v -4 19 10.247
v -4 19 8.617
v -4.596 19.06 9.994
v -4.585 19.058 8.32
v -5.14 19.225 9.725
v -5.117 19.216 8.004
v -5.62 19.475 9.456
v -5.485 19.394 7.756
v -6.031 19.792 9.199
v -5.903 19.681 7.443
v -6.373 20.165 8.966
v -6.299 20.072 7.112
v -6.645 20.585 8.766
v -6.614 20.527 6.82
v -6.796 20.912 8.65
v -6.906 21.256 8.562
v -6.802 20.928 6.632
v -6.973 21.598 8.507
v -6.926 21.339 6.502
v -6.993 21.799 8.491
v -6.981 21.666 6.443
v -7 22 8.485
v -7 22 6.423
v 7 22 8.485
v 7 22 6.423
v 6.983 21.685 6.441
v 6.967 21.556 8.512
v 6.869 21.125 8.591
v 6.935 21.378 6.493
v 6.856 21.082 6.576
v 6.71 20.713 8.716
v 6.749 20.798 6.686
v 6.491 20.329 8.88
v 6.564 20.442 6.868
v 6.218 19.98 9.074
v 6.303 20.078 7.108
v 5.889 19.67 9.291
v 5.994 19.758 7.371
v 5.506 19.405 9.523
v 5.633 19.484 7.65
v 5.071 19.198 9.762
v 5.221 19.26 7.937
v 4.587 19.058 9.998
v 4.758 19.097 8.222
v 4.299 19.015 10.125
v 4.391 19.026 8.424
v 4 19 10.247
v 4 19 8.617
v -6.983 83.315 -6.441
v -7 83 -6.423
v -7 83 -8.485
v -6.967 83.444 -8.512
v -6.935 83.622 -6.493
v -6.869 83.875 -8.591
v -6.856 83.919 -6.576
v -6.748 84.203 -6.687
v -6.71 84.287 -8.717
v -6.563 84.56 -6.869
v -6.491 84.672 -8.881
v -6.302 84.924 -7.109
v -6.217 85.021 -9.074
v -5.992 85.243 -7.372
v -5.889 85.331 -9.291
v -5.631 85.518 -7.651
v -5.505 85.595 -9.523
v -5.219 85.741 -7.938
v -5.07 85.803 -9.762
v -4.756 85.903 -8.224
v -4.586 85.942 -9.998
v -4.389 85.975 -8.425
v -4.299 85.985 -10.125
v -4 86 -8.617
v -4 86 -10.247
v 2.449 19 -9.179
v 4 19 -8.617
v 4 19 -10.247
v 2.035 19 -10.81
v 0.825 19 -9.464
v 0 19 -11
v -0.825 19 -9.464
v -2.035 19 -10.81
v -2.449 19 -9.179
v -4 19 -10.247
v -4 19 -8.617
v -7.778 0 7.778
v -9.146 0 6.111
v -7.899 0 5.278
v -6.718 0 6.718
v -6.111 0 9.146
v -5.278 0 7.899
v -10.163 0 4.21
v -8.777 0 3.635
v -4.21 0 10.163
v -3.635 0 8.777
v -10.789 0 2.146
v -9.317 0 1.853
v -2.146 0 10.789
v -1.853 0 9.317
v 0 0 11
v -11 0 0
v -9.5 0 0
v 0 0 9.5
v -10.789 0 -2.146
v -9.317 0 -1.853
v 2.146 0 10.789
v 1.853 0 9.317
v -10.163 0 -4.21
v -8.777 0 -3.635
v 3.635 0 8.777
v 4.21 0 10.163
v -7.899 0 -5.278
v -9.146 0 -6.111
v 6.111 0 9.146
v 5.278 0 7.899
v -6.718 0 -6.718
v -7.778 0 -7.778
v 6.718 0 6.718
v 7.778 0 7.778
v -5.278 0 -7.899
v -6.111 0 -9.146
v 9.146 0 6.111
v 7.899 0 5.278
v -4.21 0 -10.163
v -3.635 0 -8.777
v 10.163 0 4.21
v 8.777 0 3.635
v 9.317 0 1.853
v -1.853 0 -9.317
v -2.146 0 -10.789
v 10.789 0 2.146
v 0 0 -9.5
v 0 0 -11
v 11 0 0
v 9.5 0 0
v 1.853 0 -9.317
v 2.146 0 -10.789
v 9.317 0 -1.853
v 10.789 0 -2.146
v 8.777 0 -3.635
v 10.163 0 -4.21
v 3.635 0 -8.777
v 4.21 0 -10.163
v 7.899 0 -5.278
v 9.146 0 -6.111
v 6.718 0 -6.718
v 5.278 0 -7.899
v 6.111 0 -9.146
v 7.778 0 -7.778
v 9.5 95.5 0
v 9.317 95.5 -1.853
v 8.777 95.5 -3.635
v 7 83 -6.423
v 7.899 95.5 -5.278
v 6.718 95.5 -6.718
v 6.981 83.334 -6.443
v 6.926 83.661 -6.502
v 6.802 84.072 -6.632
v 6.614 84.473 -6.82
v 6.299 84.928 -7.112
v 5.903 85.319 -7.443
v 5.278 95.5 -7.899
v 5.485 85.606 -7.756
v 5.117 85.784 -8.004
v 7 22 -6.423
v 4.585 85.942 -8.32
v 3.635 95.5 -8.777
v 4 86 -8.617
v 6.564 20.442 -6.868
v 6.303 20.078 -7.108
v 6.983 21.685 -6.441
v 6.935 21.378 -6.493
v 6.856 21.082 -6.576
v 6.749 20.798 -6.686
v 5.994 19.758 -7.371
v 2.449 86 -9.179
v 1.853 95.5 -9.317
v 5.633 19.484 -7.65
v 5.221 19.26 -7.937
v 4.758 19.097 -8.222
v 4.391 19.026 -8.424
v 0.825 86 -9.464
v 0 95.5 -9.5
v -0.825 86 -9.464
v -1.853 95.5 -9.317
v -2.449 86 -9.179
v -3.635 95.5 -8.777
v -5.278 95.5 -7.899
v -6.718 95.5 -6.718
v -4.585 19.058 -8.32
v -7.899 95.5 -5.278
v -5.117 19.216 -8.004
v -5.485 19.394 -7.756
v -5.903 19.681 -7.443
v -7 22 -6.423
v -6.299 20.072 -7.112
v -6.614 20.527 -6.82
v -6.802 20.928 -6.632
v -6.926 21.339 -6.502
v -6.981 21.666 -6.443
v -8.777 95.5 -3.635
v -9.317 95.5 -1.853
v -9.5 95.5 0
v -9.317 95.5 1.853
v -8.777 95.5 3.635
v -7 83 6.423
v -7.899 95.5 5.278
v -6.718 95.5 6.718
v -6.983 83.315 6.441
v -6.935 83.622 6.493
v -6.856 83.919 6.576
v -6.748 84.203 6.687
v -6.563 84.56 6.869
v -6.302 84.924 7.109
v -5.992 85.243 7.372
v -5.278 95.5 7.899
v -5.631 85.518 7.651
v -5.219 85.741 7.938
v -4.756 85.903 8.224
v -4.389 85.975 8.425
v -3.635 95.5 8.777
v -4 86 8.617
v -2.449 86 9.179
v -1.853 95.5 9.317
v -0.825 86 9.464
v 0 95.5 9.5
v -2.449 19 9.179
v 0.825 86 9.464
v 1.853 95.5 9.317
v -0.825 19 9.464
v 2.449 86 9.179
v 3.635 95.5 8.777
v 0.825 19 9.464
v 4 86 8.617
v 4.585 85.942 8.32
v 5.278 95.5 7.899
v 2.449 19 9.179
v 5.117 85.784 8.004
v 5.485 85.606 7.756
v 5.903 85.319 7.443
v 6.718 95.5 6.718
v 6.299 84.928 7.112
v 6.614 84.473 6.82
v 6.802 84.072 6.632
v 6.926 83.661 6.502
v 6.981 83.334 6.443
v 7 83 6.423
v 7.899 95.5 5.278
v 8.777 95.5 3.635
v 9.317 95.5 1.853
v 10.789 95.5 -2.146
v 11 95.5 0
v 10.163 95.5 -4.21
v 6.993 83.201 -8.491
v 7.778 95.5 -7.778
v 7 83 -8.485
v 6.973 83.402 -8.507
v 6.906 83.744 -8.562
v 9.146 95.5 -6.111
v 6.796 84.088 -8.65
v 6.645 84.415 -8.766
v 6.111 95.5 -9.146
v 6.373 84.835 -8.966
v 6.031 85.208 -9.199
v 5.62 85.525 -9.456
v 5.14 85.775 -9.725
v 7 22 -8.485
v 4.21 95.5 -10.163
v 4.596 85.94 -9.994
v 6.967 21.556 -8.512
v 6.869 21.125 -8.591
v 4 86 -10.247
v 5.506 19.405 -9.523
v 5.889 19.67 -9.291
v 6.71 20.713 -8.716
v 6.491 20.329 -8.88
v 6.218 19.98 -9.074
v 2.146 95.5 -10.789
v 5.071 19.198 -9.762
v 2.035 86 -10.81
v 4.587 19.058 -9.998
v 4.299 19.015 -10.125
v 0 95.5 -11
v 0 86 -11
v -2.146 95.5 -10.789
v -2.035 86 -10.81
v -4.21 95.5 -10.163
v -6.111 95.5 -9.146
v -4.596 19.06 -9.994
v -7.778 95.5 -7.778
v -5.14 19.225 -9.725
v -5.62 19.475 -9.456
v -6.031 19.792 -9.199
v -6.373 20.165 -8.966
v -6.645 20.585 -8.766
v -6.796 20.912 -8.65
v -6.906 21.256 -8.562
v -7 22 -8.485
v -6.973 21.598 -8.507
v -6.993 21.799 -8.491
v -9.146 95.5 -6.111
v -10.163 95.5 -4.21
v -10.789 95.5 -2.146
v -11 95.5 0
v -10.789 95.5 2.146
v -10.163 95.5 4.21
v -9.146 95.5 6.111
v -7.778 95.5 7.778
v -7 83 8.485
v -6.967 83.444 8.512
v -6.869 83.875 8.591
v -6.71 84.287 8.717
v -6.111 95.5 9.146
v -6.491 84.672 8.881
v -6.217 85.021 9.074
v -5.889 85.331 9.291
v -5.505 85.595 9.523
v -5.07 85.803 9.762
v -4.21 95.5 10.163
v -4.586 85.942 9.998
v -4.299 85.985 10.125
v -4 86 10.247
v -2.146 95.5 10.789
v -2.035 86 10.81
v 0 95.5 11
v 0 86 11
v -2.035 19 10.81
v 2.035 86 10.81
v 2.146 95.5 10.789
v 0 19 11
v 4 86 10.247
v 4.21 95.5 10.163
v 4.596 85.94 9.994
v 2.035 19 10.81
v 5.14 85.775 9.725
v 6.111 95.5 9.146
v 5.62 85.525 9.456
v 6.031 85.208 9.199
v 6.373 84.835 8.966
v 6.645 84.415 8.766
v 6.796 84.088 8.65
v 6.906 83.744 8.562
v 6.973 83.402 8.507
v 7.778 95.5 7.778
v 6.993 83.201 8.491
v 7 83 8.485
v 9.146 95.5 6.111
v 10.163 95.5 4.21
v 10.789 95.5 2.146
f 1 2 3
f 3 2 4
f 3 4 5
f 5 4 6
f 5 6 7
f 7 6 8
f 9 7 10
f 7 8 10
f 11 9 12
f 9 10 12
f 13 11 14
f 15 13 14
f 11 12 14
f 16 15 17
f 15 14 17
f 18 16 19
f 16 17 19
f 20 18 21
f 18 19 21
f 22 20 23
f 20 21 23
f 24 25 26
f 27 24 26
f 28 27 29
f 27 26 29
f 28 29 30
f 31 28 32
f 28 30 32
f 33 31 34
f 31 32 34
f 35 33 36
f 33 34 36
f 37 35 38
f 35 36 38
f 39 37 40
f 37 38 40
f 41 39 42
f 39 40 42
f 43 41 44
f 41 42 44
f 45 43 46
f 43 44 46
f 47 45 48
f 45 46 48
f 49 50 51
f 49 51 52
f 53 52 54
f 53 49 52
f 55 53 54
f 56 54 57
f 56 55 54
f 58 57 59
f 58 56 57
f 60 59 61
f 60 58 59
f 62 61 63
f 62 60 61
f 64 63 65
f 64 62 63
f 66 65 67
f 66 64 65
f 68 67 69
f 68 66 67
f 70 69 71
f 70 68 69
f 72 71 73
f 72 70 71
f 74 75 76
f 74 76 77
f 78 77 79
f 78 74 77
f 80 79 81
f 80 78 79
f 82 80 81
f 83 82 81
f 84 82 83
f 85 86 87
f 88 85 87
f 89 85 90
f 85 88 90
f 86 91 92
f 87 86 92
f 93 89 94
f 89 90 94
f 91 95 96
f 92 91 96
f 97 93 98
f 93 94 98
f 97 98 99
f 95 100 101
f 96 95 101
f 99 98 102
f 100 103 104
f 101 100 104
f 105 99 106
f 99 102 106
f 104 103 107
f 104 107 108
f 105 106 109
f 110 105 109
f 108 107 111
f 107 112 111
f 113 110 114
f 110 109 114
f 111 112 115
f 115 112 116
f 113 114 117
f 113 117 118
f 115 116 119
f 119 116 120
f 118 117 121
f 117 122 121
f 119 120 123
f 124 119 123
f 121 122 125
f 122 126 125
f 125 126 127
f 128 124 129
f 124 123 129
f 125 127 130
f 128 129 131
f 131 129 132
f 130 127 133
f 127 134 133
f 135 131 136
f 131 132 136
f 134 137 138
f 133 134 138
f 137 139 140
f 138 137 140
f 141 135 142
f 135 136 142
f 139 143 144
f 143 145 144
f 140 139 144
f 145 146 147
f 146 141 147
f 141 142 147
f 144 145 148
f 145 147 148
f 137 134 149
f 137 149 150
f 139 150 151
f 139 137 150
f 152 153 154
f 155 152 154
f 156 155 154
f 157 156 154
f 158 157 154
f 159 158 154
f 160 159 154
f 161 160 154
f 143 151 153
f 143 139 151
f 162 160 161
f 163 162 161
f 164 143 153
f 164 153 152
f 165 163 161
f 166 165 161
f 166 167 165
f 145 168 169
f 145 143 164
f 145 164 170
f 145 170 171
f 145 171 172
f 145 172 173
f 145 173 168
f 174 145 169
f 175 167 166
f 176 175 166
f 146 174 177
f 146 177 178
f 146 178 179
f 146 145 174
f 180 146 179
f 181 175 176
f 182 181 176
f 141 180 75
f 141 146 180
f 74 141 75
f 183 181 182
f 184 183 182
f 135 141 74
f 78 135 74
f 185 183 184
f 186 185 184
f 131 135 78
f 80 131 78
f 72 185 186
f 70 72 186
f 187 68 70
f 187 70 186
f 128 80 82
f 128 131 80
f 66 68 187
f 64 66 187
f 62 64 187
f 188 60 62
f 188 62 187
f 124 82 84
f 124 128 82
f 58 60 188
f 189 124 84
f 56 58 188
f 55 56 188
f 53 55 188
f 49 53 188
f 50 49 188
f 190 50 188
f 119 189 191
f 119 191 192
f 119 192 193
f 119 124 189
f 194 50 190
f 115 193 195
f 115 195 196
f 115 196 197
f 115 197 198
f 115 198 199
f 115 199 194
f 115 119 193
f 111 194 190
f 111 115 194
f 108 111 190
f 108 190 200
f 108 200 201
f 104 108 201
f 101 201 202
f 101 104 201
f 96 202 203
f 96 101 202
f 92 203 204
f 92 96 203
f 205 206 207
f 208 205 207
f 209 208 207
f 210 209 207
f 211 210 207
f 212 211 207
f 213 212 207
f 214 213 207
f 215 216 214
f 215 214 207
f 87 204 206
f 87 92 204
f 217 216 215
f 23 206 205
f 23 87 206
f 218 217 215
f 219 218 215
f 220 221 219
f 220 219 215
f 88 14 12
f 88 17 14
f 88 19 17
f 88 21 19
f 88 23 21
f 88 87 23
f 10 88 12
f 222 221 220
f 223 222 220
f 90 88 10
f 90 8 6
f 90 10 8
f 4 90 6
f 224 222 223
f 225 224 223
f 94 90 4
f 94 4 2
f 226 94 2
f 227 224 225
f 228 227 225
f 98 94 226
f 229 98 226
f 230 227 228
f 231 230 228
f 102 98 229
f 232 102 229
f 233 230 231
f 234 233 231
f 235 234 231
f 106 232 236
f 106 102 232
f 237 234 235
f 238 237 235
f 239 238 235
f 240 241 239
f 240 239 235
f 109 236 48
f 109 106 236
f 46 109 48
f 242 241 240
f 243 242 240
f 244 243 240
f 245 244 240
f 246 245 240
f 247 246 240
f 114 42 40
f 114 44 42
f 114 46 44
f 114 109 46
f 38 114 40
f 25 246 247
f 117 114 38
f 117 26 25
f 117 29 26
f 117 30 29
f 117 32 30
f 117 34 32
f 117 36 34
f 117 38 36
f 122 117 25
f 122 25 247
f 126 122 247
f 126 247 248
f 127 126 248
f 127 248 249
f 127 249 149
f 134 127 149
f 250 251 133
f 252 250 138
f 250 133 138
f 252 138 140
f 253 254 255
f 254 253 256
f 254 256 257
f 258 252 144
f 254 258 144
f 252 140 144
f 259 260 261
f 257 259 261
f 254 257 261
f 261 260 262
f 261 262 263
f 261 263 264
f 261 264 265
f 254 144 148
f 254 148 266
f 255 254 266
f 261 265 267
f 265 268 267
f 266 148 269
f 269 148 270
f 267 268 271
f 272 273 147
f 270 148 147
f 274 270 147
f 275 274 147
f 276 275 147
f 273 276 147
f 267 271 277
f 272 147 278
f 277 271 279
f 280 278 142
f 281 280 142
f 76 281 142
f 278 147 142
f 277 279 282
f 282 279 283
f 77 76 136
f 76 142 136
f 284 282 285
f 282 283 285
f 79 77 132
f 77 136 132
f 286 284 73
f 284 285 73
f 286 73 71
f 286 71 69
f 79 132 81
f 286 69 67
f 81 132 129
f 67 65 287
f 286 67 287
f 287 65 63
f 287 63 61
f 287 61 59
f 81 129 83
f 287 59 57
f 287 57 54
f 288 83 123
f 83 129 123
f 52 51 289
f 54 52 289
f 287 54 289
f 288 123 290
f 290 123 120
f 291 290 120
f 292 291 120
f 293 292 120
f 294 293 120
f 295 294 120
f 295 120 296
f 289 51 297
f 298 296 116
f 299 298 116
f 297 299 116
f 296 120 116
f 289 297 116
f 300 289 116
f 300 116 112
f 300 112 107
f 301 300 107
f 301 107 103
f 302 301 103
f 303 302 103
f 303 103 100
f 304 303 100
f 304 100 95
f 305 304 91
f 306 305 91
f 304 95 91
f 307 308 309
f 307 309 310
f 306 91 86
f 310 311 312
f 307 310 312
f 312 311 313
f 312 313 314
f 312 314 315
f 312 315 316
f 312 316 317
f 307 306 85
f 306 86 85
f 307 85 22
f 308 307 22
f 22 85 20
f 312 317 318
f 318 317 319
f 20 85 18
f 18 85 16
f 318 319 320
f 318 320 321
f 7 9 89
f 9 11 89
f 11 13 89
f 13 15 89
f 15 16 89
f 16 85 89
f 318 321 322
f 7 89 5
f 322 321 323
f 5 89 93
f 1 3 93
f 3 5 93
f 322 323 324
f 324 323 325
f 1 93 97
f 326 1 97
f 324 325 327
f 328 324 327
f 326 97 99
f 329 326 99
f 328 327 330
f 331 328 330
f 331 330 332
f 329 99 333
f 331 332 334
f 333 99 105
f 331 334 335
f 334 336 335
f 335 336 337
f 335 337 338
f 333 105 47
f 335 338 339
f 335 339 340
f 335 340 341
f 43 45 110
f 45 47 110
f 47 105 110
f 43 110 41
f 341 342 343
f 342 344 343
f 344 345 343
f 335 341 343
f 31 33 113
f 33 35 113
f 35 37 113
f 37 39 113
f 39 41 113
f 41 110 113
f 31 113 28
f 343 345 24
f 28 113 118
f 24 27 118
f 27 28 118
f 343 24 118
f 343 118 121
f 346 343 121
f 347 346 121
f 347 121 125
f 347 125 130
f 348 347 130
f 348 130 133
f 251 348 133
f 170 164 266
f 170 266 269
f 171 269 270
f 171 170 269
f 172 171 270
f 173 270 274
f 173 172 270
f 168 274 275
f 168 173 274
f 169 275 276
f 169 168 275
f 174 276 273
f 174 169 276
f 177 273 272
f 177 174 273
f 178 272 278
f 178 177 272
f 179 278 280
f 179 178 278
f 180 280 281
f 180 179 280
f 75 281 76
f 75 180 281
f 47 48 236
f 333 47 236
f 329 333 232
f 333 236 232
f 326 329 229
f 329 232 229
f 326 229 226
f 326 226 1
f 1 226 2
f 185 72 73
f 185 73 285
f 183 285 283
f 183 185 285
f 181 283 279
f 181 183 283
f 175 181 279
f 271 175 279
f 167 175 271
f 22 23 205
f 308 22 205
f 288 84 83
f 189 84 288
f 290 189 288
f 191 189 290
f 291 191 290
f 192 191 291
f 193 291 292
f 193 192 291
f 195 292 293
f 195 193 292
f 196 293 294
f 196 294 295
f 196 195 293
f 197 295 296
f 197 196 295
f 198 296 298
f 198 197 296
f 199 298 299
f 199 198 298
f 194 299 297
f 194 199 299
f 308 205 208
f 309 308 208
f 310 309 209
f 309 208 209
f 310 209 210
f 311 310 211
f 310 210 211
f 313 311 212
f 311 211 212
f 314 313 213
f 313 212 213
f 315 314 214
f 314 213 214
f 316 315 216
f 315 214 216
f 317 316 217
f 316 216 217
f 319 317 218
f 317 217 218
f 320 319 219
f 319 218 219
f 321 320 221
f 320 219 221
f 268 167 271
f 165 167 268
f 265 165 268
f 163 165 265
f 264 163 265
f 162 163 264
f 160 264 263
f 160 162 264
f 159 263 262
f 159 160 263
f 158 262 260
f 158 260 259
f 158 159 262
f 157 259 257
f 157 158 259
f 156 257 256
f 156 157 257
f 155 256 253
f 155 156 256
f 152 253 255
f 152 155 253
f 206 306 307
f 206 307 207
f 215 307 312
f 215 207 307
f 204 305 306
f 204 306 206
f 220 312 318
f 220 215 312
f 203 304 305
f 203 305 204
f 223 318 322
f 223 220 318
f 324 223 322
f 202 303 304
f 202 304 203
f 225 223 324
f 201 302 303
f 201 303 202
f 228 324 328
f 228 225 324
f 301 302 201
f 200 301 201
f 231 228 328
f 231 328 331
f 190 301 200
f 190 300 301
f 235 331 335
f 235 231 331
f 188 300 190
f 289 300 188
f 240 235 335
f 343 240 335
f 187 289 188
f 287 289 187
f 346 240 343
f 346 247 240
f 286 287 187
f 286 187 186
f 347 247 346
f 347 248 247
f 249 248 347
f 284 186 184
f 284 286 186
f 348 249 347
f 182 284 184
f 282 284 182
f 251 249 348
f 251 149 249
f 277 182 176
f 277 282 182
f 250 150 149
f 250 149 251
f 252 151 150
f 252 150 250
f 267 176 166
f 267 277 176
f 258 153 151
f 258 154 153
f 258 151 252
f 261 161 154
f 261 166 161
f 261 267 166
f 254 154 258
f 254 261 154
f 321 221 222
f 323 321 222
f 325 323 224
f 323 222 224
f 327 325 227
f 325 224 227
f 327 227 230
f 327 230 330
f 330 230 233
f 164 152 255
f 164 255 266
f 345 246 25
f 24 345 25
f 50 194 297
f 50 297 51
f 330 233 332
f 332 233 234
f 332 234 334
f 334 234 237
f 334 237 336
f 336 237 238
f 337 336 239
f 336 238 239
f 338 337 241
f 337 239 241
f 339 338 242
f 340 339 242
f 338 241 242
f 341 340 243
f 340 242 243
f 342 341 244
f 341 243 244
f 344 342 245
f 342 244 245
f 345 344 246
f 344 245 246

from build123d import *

# Parameters (mm, degrees)
SKETCH1_R               = 11
SKETCH1_R_2             = 9.5
BOSS_EXTRUDE1_DEPTH     = 95.5
CUT_EXTRUDE1_DEPTH      = 12
CUT_EXTRUDE1_DEPTH_BACK = 12


with BuildPart() as part:
    # Sketch1 → Boss-Extrude1 (new body)
    with BuildSketch(Plane(origin=(0, 0, 0), x_dir=(1, 0, 0), z_dir=(0, 1, 0))):
        Circle(SKETCH1_R)
        Circle(SKETCH1_R_2, mode=Mode.SUBTRACT)
    extrude(amount=BOSS_EXTRUDE1_DEPTH)

    # Sketch2 → Cut-Extrude1 (cut, two sides)
    with BuildSketch(Plane.XY) as cut_extrude1_sk:
        with BuildLine():
            ThreePointArc((-7, 83), (-6.121320344, 85.121320344), (-4, 86))
            Line((-4, 86), (4, 86))
            ThreePointArc((4, 86), (6.121320344, 85.121320344), (7, 83))
            Line((7, 83), (7, 22))
            ThreePointArc((7, 22), (6.121320344, 19.878679656), (4, 19))
            Line((4, 19), (-4, 19))
            ThreePointArc((-4, 19), (-6.121320344, 19.878679656), (-7, 22))
            Line((-7, 22), (-7, 83))
        make_face()
    extrude(amount=CUT_EXTRUDE1_DEPTH, mode=Mode.SUBTRACT)
    extrude(cut_extrude1_sk.sketch, amount=-CUT_EXTRUDE1_DEPTH_BACK, mode=Mode.SUBTRACT)


solid = part.part
